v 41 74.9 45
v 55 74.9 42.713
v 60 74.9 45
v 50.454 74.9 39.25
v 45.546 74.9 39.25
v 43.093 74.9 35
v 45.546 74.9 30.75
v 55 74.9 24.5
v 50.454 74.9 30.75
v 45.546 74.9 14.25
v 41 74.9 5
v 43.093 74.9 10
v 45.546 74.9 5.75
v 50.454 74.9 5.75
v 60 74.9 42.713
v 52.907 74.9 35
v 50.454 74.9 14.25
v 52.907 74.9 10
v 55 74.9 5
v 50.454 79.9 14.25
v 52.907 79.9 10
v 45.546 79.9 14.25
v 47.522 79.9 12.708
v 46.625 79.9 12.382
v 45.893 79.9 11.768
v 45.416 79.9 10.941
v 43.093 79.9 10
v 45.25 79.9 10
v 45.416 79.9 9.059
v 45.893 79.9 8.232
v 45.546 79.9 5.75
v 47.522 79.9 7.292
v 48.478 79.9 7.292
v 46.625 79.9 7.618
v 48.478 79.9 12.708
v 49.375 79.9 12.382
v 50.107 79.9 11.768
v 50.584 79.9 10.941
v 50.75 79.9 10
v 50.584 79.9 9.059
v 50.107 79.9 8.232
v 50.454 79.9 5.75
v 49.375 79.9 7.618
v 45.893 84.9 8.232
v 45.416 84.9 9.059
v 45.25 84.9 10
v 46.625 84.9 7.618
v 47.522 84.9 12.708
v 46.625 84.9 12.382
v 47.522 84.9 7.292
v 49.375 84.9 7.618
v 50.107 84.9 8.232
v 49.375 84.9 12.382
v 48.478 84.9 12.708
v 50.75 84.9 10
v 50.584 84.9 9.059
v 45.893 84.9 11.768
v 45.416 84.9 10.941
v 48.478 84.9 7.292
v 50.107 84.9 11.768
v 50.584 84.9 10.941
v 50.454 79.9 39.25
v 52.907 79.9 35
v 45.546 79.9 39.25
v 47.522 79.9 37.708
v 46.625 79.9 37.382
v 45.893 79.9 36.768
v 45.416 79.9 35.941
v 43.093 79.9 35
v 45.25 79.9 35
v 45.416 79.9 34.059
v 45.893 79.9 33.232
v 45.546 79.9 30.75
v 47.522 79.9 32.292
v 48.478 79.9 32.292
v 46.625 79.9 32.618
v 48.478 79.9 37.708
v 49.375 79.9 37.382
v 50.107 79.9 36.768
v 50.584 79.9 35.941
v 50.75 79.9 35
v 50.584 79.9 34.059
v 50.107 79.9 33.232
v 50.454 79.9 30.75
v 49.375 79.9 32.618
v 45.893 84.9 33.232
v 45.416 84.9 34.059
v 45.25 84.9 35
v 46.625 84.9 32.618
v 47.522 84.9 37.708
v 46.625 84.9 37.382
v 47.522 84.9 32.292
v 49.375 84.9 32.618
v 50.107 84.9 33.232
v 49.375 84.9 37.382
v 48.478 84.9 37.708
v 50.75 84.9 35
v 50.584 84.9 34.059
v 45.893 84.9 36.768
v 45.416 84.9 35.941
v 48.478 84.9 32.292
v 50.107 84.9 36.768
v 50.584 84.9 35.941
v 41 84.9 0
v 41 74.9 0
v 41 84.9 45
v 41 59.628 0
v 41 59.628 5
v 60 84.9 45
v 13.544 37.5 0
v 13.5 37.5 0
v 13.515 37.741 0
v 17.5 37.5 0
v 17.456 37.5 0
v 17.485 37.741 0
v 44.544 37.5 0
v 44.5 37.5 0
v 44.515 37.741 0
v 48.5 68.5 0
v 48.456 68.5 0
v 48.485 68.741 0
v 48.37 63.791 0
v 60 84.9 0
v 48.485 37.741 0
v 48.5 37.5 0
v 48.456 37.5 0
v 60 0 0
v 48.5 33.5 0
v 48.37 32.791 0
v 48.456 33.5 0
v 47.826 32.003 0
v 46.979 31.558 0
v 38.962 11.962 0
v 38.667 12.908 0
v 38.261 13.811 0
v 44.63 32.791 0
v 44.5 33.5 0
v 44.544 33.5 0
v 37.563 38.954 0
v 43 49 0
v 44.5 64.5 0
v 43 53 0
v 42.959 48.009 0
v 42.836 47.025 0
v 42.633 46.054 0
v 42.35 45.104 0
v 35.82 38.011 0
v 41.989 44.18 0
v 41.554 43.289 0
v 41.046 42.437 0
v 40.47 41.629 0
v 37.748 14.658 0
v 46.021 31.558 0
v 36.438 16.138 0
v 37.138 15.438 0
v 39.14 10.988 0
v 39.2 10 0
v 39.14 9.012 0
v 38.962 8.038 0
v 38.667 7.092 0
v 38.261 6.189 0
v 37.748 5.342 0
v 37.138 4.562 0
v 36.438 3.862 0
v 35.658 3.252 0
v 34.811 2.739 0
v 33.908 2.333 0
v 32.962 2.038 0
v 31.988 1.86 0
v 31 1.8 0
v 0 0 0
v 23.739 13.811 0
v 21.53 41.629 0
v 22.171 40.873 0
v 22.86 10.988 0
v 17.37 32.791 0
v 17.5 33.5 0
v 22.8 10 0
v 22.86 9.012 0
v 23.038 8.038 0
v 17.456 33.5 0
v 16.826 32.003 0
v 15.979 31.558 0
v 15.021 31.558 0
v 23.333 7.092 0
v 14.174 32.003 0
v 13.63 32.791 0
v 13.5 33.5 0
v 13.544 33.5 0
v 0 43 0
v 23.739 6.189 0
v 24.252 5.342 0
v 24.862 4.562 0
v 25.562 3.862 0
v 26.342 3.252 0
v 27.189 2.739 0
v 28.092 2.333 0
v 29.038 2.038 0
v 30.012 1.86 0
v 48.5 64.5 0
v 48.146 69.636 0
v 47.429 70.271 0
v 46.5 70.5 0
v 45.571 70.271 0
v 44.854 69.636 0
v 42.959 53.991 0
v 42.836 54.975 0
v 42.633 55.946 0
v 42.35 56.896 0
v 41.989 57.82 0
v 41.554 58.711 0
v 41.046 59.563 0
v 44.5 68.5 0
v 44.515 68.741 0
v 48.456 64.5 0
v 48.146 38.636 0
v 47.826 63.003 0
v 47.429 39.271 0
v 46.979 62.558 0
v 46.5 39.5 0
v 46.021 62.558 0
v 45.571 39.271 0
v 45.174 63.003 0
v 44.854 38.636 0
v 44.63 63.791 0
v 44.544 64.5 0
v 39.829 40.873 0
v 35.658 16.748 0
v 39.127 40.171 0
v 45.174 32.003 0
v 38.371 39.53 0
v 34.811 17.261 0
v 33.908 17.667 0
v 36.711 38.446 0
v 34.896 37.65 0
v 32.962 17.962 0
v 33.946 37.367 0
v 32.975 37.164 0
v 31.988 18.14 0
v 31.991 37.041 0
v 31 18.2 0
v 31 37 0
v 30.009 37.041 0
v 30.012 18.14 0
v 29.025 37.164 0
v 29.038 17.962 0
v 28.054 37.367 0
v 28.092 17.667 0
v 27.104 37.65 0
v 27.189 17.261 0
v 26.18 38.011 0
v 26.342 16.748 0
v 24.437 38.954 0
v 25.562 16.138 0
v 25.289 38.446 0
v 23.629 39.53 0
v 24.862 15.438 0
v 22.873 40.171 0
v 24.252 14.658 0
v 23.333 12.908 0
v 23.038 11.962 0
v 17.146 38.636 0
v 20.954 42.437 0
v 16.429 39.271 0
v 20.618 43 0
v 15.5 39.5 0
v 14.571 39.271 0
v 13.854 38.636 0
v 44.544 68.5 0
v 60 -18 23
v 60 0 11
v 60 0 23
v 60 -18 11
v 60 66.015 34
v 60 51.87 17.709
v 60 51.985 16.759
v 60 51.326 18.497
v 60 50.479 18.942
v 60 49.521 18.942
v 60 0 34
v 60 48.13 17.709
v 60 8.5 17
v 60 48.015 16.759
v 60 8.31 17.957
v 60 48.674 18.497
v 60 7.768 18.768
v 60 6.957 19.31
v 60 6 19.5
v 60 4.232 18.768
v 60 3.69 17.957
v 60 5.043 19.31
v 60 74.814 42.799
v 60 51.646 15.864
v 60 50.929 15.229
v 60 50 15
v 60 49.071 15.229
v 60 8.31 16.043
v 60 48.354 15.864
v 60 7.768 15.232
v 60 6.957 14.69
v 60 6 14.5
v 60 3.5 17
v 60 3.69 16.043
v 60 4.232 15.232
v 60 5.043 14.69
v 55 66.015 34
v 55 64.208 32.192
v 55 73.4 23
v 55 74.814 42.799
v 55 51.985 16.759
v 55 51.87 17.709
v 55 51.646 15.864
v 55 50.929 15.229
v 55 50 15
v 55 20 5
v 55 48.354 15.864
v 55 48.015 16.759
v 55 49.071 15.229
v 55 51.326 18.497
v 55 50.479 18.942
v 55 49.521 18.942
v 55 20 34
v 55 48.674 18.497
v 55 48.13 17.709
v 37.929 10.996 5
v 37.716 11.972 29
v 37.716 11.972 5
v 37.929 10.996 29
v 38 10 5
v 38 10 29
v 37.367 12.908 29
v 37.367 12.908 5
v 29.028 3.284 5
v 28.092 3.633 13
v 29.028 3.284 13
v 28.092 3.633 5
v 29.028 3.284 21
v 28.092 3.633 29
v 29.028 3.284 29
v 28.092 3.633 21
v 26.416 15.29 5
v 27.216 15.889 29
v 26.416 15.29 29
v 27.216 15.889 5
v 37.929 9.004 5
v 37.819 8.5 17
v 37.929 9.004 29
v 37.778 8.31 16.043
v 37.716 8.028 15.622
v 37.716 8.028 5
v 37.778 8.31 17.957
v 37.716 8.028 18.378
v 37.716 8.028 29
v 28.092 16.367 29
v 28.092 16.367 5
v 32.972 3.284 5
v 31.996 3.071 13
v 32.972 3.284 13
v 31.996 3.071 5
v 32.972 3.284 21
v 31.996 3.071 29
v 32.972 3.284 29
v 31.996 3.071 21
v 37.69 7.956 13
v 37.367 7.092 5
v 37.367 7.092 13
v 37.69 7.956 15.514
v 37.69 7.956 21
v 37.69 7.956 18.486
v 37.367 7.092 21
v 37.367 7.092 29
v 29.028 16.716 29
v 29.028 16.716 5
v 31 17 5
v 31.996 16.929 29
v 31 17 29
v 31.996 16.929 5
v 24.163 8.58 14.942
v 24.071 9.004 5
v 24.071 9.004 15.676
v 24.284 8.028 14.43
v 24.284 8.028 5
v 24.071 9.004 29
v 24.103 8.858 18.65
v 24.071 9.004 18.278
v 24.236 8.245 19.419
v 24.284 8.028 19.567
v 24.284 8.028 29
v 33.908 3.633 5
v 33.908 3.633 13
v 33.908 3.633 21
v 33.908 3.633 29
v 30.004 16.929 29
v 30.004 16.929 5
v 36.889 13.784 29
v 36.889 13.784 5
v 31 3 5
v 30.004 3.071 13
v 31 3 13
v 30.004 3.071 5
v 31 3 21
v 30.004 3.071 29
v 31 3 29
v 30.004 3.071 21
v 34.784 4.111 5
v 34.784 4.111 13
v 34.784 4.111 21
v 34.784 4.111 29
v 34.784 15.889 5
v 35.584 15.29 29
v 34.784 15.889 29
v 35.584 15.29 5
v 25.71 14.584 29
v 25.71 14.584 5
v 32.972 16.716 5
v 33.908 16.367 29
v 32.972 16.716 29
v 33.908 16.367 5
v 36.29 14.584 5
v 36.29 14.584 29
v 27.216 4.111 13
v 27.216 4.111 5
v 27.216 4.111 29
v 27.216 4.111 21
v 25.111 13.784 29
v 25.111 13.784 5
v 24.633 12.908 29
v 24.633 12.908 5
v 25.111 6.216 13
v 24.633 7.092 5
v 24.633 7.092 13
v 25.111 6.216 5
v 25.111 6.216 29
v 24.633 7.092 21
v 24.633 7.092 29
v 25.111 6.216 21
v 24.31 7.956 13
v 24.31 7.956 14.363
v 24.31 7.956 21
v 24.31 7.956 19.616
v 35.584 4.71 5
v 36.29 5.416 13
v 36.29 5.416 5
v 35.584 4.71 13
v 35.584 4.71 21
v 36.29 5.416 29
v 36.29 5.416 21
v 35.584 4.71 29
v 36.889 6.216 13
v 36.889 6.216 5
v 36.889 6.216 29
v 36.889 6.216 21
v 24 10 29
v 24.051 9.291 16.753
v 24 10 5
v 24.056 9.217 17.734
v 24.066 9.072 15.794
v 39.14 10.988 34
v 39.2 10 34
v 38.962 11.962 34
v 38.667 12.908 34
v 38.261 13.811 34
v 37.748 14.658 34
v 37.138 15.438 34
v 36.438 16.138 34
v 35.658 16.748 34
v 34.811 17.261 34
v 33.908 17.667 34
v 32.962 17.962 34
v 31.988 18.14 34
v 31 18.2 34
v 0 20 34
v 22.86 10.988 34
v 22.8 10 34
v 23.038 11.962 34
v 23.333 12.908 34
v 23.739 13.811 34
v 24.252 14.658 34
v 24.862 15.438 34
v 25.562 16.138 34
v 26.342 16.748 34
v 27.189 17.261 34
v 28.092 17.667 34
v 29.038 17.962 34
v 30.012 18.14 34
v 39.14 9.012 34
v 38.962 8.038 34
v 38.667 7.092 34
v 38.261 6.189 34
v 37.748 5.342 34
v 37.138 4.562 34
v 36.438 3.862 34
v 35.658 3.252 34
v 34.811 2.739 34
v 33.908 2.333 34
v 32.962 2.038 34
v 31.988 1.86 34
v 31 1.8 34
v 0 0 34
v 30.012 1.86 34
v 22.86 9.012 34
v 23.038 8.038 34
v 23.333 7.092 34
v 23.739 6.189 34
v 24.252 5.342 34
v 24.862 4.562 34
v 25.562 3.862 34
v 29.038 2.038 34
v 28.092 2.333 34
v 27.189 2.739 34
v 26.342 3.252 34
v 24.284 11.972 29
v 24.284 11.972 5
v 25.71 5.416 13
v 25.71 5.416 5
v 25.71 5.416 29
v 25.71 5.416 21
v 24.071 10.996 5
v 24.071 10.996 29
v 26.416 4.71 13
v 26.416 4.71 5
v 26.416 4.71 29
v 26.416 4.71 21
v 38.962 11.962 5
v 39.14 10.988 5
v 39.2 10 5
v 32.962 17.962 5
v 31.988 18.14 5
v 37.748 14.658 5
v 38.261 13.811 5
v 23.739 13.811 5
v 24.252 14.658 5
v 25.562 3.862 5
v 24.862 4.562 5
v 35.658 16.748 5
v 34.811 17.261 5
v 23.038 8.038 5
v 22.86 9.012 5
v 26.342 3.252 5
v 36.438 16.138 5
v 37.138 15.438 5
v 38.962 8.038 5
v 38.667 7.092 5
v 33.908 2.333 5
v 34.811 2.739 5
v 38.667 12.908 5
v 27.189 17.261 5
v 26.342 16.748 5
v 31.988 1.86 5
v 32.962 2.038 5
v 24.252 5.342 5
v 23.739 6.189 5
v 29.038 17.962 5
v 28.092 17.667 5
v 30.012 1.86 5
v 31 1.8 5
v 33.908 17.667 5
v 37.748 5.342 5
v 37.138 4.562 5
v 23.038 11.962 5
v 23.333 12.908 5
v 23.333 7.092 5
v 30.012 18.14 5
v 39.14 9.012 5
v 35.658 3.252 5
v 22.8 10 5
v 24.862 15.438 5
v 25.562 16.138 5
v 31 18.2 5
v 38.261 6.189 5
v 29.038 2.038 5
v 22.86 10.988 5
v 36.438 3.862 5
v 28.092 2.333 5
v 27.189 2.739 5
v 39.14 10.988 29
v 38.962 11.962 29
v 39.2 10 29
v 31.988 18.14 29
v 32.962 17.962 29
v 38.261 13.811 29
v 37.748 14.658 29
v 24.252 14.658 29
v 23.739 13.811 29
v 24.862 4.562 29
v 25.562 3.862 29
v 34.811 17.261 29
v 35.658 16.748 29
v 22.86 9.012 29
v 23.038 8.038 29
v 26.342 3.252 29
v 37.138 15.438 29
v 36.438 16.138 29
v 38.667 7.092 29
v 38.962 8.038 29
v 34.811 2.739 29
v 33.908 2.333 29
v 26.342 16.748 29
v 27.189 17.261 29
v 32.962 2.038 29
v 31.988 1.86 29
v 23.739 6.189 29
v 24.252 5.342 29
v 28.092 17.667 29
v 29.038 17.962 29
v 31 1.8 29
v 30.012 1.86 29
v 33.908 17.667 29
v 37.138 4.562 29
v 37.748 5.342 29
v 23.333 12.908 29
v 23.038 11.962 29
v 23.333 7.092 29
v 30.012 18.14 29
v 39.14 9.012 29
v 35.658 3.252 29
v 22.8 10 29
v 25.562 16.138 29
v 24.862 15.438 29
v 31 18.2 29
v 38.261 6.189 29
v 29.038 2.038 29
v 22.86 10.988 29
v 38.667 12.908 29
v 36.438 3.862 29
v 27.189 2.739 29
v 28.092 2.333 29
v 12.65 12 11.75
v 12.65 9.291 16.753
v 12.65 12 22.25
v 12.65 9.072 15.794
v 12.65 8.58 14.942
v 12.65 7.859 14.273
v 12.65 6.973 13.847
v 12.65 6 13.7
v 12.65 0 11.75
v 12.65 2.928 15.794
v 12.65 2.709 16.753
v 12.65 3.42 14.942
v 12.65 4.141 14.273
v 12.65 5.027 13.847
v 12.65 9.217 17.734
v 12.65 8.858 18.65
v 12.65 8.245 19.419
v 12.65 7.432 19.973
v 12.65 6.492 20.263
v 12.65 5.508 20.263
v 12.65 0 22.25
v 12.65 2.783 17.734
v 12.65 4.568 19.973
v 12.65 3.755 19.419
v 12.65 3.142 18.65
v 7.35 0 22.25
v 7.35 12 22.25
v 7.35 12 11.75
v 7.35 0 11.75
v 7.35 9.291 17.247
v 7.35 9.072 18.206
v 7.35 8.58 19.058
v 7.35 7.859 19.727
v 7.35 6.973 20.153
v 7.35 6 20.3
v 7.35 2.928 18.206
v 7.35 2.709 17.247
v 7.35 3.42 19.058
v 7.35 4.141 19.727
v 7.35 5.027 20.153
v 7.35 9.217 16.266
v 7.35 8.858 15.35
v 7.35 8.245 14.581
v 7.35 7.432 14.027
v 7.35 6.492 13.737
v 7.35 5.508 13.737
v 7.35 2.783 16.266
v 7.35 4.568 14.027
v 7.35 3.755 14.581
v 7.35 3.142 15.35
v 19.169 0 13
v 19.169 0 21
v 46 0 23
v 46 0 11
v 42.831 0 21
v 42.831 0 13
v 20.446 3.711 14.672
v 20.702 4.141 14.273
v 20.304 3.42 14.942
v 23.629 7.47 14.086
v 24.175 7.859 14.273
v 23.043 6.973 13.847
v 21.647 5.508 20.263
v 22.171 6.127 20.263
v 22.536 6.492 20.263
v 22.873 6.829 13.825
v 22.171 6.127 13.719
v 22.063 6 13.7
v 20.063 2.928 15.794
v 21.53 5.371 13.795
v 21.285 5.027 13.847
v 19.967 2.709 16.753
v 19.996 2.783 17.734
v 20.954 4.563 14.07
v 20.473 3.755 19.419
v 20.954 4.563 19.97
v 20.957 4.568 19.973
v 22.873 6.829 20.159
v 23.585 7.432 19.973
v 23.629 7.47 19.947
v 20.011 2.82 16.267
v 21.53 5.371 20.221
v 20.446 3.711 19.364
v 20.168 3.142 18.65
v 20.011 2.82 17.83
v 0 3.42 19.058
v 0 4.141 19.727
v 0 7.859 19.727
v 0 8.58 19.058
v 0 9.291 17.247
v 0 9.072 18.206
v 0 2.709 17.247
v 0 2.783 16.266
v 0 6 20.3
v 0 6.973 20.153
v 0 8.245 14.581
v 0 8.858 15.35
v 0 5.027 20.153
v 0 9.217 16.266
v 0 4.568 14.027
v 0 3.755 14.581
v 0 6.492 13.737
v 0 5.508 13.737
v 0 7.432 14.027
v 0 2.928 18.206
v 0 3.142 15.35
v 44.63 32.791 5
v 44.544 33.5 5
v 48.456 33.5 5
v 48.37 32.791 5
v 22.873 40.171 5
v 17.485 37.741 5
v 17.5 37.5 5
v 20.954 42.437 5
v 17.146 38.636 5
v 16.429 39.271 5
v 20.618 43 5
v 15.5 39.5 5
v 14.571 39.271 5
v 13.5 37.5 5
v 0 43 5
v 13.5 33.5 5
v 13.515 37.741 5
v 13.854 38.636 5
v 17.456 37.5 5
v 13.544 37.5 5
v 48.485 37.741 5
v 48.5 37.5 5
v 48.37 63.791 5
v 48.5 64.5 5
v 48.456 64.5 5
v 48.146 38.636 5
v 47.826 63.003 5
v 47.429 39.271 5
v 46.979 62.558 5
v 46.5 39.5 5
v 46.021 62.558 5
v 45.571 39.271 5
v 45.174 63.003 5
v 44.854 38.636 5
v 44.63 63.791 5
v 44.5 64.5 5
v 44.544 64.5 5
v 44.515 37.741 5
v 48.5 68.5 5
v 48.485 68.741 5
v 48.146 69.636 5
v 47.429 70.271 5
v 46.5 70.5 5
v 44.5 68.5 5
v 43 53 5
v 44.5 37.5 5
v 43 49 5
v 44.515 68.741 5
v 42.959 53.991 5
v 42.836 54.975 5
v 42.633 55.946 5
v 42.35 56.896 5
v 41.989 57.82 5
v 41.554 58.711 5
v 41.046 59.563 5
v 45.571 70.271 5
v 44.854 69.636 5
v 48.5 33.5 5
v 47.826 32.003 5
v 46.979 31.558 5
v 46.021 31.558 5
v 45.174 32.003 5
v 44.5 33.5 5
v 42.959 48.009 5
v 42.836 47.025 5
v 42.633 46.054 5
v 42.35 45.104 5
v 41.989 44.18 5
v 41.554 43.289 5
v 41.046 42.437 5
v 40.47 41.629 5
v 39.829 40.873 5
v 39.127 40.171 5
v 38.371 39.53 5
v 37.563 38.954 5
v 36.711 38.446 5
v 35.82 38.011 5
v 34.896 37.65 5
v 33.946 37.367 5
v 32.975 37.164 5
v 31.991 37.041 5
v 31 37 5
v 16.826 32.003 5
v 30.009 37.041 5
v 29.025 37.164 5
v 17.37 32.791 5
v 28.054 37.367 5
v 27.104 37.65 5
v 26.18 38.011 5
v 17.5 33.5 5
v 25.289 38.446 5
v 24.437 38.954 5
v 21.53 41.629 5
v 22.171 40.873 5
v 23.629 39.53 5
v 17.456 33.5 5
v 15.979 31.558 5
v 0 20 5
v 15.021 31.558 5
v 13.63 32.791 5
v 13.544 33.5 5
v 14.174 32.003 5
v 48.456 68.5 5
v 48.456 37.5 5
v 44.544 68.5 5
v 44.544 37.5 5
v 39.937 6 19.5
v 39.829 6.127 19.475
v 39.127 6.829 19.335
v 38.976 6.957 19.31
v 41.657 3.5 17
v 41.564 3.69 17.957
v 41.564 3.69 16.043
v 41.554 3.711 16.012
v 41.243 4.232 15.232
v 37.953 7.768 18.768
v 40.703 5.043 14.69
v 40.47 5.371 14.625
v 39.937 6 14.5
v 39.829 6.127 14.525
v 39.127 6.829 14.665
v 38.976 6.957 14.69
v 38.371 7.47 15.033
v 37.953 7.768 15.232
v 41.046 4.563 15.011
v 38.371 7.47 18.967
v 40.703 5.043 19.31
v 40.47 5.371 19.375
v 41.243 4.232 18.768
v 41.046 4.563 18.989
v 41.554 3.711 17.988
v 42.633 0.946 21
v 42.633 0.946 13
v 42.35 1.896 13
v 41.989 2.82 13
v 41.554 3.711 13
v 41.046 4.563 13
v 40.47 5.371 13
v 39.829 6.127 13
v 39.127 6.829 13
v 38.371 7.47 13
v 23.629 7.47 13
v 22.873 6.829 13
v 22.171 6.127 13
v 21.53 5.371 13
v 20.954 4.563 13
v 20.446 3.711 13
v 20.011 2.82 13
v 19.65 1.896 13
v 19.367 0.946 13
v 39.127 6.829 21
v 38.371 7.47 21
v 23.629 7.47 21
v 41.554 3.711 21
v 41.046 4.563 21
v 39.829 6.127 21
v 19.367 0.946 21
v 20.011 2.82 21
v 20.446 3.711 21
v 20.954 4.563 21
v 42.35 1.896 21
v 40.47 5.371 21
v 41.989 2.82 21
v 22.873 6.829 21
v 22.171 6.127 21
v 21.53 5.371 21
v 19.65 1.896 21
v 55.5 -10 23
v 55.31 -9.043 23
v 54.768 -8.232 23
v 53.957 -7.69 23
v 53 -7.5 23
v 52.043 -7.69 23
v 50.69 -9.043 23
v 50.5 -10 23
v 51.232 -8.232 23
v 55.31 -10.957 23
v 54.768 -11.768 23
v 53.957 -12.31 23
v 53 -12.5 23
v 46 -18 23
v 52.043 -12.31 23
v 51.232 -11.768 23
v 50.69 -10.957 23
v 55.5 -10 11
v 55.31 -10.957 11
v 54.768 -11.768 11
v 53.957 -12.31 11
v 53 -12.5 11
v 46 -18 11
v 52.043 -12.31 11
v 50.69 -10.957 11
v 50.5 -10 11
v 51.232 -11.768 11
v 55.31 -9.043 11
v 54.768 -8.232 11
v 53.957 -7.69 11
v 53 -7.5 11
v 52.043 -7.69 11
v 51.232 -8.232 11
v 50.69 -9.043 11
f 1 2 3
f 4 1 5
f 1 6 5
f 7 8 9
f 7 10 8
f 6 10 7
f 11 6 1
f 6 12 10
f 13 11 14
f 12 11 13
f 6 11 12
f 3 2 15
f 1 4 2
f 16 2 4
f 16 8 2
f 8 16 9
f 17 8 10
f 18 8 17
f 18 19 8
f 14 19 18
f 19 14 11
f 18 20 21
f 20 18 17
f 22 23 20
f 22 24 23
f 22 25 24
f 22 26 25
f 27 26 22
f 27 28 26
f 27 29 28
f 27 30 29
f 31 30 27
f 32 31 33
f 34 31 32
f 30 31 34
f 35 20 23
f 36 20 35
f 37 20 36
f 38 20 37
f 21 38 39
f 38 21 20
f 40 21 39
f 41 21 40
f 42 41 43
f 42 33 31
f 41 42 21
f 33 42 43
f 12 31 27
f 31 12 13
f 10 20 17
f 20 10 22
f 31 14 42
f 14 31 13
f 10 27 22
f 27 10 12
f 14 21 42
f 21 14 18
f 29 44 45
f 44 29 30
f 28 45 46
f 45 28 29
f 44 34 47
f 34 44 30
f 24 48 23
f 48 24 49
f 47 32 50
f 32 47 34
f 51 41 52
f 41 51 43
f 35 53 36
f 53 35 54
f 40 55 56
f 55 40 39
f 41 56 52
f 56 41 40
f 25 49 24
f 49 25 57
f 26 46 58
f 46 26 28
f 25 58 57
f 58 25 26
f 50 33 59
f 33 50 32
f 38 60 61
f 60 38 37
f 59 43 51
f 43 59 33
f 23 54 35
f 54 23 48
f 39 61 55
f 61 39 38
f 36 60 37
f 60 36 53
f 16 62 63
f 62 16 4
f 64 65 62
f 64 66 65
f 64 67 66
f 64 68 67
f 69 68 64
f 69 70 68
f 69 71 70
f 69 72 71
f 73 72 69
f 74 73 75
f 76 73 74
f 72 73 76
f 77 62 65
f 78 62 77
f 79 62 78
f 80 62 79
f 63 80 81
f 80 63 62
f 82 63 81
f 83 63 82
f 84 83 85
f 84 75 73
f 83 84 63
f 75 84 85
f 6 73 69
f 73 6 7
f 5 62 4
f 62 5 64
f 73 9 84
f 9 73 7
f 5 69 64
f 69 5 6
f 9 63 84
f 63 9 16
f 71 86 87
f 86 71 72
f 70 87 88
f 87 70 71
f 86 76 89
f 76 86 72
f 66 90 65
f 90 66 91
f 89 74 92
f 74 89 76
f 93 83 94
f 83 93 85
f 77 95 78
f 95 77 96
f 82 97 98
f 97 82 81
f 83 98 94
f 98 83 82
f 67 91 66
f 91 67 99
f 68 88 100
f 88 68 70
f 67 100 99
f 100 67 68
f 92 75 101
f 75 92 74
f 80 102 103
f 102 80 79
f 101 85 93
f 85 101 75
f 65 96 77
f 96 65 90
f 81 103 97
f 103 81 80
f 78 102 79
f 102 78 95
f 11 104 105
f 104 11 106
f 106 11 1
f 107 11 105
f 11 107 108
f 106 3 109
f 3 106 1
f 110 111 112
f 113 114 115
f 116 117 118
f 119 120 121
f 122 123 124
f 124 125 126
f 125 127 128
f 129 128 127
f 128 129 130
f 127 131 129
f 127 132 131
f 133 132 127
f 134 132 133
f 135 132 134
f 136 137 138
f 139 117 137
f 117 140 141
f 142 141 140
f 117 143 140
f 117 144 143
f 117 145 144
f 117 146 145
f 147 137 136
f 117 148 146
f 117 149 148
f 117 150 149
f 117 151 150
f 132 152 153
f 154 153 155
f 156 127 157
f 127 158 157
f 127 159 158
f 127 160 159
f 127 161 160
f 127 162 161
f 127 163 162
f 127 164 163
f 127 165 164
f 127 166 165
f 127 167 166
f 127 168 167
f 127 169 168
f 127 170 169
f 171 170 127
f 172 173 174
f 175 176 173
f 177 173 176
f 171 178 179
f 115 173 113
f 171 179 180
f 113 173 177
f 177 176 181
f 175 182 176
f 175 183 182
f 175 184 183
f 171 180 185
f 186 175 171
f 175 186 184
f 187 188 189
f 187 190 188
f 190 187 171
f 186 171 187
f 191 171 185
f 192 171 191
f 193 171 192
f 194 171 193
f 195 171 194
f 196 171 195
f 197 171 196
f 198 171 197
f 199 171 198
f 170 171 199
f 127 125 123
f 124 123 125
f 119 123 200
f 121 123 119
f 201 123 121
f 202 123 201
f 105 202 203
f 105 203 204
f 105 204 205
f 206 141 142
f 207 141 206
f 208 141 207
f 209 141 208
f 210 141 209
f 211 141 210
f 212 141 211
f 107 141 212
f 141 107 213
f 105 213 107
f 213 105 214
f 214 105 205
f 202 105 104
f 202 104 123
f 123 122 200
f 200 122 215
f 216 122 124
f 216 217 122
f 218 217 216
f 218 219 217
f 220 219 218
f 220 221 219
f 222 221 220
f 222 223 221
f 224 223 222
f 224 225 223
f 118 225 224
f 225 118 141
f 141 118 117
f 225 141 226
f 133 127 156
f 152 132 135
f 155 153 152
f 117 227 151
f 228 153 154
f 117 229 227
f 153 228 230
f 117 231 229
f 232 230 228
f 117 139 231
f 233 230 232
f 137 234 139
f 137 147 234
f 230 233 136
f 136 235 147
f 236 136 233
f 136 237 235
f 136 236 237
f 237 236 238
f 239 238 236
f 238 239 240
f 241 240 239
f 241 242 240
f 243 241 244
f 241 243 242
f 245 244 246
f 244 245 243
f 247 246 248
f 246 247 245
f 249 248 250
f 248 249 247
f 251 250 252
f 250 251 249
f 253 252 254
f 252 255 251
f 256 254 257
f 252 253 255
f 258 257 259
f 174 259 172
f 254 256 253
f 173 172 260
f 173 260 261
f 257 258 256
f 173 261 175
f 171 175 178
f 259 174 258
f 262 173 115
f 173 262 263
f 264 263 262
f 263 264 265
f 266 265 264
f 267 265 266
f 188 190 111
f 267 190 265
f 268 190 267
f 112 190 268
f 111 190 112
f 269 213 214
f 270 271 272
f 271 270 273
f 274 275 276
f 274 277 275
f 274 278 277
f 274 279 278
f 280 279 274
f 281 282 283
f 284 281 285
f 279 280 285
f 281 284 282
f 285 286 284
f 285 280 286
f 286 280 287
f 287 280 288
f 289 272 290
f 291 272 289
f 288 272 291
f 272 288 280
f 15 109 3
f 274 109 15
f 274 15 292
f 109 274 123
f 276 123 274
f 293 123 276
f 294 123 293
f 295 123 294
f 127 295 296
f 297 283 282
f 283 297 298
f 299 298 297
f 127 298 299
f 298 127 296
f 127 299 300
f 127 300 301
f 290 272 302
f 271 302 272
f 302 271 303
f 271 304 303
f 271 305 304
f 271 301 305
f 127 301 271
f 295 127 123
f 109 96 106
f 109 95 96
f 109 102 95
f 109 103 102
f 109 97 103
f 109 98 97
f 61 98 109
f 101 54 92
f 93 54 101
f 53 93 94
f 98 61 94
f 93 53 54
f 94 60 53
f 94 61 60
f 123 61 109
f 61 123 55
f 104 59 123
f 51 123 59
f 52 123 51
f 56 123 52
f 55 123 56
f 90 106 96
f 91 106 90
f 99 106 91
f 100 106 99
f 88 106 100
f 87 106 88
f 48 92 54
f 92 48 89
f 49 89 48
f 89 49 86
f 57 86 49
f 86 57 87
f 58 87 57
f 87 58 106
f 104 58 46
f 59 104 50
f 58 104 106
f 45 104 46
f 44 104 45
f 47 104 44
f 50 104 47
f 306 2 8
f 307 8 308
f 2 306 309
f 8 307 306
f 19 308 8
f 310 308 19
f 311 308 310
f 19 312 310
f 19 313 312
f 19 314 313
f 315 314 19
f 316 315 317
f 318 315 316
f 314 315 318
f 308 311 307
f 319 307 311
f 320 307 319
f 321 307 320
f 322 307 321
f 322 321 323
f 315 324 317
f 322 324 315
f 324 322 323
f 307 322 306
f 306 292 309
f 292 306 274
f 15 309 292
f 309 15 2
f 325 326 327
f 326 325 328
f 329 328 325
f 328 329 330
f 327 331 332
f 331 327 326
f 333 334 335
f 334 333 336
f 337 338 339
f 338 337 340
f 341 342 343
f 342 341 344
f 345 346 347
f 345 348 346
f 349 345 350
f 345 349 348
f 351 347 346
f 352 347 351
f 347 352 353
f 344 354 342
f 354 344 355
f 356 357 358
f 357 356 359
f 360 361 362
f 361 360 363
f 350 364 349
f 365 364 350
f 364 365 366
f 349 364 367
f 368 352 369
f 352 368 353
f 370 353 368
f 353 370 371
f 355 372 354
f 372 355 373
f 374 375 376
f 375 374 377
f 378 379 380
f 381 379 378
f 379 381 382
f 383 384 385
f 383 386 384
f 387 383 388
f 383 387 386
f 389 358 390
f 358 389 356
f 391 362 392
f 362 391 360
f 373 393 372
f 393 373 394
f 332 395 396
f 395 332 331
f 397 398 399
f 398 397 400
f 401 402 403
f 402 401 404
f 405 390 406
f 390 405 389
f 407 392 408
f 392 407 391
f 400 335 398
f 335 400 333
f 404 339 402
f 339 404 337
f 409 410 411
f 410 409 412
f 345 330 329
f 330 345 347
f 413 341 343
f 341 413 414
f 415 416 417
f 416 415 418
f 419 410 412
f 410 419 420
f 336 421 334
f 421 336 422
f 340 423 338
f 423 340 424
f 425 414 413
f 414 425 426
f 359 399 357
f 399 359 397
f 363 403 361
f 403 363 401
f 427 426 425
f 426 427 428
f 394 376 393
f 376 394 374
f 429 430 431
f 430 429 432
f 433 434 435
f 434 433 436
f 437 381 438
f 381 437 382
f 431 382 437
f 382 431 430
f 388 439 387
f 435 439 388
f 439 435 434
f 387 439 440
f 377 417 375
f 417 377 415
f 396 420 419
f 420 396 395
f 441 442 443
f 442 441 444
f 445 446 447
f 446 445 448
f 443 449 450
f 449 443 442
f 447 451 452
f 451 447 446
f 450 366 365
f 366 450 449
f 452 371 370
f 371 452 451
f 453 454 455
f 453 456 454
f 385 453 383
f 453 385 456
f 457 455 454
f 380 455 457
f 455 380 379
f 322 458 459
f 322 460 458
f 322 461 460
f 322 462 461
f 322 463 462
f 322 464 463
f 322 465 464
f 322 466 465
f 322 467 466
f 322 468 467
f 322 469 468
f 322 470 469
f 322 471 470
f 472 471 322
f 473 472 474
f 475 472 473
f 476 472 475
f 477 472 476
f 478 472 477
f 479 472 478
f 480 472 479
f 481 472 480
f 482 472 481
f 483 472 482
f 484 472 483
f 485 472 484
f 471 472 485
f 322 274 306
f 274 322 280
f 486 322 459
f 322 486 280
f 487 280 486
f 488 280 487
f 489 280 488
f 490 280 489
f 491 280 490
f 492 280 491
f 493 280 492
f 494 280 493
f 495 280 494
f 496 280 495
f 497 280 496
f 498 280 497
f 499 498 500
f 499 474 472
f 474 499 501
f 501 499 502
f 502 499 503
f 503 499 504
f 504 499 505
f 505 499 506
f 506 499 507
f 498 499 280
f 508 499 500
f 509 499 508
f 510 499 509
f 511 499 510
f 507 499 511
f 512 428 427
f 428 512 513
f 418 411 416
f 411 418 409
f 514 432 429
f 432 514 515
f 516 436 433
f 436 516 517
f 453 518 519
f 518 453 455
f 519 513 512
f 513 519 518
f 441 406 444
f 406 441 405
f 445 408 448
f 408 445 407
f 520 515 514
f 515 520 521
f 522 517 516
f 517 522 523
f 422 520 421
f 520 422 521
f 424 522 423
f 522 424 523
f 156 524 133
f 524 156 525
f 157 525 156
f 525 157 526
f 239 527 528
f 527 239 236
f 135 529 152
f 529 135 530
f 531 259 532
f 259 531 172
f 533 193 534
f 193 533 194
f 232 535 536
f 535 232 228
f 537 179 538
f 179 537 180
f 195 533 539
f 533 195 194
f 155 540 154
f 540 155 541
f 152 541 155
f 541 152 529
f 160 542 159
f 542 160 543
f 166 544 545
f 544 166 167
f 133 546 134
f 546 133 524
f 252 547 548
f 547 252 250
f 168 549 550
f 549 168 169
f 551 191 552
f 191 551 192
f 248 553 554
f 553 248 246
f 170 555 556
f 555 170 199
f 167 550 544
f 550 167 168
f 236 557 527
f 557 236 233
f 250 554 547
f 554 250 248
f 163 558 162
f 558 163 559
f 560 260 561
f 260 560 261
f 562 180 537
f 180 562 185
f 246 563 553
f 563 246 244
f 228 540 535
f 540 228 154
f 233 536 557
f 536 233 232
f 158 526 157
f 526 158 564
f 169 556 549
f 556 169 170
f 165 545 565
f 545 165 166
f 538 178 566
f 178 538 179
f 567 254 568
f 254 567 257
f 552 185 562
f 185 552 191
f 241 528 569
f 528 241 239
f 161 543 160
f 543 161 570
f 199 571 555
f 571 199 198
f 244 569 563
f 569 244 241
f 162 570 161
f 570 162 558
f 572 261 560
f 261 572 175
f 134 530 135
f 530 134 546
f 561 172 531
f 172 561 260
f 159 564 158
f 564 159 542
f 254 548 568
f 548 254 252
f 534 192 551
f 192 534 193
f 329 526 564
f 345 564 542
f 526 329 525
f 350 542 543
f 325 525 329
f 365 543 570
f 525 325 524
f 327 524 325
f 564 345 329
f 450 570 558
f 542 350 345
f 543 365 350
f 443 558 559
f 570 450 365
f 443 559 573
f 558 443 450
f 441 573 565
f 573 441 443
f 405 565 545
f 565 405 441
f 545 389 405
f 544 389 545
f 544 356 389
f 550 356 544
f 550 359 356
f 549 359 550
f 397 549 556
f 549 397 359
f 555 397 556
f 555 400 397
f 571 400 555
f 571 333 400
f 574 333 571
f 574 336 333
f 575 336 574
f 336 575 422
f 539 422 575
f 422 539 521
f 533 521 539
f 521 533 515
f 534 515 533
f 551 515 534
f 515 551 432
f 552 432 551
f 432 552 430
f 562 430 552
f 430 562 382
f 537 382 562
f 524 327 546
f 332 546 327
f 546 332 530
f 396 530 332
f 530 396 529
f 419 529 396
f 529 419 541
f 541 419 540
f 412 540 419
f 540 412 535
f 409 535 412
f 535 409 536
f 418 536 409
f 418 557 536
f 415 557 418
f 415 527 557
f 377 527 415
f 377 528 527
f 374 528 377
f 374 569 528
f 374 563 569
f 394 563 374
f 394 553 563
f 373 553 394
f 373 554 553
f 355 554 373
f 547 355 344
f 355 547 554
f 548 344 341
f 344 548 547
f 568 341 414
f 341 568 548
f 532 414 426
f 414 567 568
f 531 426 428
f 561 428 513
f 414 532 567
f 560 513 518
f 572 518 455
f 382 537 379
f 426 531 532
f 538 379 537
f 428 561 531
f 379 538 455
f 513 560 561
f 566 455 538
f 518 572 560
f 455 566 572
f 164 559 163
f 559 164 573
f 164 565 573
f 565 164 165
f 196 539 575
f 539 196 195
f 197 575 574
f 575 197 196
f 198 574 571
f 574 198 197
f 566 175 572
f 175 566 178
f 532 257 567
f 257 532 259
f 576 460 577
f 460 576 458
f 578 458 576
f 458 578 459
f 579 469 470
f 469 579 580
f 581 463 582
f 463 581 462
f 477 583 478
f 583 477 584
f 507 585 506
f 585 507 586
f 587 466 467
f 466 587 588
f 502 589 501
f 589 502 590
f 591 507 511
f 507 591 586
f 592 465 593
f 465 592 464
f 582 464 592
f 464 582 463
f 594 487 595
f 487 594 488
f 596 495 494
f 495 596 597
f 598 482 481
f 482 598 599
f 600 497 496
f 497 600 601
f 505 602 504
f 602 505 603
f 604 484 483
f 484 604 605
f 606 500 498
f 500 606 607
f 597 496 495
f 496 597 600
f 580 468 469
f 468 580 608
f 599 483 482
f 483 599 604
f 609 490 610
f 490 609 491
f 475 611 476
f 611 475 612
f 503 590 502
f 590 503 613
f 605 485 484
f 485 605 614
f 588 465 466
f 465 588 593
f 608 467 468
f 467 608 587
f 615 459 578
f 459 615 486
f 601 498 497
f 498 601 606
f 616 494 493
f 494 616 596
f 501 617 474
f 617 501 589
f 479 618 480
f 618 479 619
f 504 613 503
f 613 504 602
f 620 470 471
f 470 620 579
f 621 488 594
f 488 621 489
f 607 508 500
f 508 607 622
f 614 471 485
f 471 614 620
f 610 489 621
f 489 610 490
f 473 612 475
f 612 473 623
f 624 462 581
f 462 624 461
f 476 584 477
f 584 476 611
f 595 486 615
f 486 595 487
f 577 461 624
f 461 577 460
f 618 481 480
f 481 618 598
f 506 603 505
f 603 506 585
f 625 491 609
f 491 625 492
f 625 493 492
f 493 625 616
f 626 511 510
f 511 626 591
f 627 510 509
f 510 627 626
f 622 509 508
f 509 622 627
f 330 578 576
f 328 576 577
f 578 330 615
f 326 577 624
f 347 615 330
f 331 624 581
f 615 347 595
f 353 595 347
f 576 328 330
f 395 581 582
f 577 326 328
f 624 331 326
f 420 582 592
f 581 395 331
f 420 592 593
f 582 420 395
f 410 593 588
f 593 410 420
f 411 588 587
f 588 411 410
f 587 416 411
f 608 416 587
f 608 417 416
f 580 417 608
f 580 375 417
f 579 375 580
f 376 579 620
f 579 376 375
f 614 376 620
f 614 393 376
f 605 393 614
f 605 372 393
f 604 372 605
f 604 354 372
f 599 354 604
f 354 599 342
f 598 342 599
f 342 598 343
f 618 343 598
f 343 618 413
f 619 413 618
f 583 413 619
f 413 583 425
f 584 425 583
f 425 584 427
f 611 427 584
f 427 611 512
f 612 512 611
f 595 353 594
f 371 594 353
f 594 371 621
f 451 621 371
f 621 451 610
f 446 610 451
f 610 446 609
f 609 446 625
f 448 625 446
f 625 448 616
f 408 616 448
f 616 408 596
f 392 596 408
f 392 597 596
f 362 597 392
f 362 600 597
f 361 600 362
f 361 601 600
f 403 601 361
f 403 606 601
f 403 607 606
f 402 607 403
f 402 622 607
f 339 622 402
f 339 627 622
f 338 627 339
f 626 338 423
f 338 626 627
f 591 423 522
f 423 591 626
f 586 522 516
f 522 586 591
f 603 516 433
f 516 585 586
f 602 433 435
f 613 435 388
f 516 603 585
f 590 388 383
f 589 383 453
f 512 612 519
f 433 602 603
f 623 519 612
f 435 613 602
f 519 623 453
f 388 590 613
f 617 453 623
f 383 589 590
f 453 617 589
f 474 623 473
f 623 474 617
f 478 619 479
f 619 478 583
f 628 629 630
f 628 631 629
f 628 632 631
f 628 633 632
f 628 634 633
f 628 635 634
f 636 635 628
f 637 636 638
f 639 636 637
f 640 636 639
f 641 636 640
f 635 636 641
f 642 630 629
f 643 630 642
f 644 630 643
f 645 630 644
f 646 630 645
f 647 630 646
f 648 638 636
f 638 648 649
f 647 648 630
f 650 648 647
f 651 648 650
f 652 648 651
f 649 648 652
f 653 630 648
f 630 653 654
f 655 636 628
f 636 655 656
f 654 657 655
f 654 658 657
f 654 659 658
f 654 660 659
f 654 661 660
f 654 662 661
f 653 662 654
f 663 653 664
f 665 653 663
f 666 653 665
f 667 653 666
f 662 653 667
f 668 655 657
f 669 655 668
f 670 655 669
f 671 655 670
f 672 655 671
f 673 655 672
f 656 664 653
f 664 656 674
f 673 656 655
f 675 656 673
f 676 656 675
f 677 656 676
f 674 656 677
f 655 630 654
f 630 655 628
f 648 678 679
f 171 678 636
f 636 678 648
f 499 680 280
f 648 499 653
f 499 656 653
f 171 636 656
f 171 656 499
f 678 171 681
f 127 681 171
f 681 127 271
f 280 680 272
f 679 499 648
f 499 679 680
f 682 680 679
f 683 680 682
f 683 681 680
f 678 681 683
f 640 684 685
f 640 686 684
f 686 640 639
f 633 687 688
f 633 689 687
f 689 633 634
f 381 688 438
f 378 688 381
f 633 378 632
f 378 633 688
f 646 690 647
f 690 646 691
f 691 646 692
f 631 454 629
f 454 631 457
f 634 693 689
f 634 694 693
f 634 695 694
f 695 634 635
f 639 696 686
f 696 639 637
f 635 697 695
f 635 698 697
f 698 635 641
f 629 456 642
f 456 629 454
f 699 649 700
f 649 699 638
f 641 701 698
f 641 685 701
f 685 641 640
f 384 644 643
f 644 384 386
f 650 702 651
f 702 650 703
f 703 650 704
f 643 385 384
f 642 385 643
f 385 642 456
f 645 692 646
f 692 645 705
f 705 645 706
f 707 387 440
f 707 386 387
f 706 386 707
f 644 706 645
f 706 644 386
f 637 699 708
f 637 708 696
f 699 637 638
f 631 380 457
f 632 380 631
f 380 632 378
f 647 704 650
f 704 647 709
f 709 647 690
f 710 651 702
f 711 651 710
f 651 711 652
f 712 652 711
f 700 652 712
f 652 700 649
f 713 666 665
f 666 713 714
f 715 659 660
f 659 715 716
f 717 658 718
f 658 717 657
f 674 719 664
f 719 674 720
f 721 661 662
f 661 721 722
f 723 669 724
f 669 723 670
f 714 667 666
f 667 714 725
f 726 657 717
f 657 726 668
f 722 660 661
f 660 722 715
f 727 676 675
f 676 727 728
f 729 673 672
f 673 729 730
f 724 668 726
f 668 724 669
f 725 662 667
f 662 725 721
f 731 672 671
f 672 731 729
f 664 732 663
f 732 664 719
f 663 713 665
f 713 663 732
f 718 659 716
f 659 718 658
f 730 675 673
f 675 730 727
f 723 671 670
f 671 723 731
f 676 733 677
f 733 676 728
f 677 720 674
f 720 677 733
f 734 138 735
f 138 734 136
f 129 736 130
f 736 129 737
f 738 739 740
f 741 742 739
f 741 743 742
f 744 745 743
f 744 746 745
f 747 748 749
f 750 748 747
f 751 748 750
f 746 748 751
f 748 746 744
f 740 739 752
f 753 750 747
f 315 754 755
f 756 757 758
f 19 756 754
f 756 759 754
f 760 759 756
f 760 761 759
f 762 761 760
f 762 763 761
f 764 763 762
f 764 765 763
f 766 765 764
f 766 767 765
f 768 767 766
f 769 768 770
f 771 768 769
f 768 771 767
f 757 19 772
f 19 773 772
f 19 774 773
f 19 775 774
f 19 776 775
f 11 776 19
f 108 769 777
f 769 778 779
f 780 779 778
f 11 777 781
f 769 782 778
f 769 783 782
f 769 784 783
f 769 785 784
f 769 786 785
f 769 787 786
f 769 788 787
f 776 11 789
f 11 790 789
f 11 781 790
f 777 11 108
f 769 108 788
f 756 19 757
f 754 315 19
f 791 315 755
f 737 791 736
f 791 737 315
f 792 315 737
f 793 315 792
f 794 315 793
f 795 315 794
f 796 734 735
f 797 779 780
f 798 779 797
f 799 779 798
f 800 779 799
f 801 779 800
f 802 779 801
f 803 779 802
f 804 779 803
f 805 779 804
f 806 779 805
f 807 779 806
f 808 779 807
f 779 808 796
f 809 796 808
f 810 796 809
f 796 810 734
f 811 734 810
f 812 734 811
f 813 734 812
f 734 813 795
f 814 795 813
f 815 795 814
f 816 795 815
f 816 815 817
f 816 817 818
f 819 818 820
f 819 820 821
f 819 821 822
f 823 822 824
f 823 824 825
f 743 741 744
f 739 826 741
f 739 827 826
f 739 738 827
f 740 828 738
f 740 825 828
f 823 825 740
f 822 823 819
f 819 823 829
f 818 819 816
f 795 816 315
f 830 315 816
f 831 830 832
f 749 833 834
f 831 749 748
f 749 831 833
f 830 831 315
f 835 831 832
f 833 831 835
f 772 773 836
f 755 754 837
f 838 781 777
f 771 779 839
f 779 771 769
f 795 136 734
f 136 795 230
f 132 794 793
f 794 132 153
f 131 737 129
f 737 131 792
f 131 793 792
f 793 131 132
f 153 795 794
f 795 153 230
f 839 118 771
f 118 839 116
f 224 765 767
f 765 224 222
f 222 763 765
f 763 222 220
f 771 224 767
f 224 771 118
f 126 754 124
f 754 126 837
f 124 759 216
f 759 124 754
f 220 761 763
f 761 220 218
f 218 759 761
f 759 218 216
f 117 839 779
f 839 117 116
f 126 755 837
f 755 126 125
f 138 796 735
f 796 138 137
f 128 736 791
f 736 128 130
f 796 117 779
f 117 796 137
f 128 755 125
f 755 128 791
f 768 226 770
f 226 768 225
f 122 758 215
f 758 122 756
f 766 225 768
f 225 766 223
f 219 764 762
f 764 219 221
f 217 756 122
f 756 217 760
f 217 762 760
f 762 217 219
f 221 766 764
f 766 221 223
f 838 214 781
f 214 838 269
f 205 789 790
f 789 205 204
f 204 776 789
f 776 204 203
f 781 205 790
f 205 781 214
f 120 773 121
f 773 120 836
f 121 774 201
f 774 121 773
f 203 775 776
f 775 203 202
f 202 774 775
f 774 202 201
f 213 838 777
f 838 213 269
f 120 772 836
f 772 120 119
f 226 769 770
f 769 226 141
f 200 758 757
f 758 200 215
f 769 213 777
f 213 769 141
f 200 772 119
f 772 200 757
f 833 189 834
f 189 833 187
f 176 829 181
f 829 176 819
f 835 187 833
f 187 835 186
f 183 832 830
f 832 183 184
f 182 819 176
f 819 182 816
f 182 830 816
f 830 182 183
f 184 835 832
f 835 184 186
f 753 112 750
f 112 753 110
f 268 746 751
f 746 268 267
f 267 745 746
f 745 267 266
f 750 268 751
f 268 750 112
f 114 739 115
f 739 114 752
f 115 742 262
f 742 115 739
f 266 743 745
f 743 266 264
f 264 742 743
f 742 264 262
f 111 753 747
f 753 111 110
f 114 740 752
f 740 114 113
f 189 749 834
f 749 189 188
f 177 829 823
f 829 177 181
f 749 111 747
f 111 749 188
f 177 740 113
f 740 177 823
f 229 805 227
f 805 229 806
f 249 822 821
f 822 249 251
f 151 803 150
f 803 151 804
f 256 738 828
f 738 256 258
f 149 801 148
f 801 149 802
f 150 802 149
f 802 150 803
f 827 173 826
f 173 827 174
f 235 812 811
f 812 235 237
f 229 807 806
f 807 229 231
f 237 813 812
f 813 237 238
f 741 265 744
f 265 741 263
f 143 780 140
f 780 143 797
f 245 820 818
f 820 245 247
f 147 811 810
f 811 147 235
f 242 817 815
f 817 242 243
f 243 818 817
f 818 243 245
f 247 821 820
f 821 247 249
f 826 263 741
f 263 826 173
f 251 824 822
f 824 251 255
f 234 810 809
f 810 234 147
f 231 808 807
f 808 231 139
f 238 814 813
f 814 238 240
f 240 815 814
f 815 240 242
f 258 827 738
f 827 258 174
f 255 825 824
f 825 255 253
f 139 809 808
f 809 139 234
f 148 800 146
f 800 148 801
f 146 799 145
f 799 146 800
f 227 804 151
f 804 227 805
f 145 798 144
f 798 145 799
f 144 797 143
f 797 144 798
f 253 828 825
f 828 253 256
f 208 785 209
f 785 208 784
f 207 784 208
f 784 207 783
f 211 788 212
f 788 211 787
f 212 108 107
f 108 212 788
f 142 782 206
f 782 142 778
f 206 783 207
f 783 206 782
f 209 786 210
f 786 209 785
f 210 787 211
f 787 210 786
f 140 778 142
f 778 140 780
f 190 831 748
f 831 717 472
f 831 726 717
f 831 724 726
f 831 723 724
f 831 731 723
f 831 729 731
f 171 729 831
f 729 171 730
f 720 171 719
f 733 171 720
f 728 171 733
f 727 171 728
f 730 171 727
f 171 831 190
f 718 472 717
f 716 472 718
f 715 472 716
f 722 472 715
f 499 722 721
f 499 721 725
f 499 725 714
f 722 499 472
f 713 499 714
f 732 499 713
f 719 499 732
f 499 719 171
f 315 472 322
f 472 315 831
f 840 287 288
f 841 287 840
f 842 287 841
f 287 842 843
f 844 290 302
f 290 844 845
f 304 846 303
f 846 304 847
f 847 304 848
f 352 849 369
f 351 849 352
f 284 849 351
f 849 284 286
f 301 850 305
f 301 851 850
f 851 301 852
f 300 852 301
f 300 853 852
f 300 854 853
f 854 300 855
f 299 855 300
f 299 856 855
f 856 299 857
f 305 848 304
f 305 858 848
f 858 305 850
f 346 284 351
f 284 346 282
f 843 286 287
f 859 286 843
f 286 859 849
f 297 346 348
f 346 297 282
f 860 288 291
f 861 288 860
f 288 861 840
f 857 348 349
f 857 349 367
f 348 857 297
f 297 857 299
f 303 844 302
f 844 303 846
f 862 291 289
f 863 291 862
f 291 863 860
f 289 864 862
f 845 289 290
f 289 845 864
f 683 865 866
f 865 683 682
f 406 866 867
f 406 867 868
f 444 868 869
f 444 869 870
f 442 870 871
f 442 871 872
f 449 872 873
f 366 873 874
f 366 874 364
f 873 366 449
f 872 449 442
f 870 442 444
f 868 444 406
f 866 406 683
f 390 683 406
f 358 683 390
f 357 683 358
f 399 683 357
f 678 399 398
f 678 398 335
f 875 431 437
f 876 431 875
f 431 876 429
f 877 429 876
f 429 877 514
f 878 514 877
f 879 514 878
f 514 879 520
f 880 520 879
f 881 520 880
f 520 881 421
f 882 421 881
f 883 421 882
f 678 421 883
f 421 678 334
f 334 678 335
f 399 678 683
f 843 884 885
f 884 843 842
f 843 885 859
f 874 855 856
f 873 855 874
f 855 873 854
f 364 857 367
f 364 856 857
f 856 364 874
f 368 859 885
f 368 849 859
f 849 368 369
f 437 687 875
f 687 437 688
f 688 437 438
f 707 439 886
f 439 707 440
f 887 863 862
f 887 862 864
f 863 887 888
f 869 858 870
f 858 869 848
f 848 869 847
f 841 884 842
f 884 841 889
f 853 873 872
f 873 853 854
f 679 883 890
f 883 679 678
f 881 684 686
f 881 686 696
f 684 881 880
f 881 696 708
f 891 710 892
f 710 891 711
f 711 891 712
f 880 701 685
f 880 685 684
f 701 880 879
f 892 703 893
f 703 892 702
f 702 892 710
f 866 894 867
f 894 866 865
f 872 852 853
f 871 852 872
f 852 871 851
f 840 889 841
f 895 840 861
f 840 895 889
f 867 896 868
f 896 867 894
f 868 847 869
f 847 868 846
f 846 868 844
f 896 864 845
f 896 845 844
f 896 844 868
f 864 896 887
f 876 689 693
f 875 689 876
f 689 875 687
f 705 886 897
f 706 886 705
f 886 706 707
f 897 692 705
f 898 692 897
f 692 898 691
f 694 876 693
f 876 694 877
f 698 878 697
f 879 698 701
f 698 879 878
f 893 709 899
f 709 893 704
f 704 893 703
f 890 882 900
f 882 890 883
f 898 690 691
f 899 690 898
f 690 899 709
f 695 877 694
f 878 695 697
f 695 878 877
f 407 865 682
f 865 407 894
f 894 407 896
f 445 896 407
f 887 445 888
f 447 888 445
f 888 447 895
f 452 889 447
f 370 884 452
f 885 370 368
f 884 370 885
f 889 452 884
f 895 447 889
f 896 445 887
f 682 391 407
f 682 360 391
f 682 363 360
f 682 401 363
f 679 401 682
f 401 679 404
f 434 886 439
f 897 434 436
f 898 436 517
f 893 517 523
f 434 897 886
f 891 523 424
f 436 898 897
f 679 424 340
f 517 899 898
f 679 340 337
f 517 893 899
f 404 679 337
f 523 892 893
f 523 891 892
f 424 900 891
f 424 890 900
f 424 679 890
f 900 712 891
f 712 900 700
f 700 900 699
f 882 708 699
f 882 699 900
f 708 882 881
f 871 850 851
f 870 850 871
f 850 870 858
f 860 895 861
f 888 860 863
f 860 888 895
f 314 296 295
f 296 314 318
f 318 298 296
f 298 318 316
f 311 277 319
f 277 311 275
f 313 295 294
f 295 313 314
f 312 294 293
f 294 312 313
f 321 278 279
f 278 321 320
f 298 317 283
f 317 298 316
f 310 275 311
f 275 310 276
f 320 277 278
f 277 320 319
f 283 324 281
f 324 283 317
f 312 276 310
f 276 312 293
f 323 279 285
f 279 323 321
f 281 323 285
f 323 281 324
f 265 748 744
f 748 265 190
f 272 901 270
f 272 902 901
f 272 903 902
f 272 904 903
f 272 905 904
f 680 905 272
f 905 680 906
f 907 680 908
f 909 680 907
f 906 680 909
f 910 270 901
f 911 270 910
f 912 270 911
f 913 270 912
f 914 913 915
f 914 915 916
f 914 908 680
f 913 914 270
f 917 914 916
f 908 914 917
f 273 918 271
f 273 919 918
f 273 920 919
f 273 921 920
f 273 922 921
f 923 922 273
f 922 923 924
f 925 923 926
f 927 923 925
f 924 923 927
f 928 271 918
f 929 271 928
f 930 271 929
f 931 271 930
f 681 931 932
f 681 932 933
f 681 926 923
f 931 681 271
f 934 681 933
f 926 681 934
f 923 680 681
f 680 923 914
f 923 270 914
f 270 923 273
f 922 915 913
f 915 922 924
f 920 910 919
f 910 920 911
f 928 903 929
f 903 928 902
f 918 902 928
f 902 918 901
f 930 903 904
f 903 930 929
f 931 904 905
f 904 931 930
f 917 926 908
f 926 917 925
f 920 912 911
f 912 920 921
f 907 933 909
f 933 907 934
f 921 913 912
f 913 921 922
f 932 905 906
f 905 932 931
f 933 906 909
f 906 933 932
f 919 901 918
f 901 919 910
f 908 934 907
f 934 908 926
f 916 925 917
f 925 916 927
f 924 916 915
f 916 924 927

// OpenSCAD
// file: util.scad
/* Tête de vis six pans
	d = distance plat à plat opposé. 
 	h = épaisseur de l'écrou 
*/
module sixpans(d, h) {

	for(i=[0:60:120]) 
	rotate(i+30, [0,0,1]) cube([d,d*tan(30),h], true);
}

/* Ovale plat (pour trous coulissants)
	d = diamètre du trou
   l = longueur du trou 
	h = épaisseur du trou
*/
module ovale(d, l, h) {
	translate([-(l-d)/2,0,0]) cylinder(h, d/2, d/2, true);
	translate([(l-d)/2,0,0])	cylinder(h, d/2, d/2, true);
	cube([l-d,d,h],true);
}

/* Trous pour un moteur Nama 17
	h = épaisseur des trous
	j = jeu de glissement
*/
module nema17(h, j) {
	translate([-15.5,-15.5,0]) ovale(4, 4 + j, h);
	translate([ 15.5,-15.5,0]) ovale(4, 4 + j, h);
	translate([-15.5, 15.5,0]) ovale(4, 4 + j, h);
	translate([ 15.5, 15.5,0]) ovale(4, 4 + j, h);
	ovale(24, 24 + j, h);
}

/* Vis six pans
	de = distance plat à plat opposé de la tête
 	he = épaisseur de la tête
	dv = diamètre de la vis
	l = longueur totale de la vis
*/
module vissixpans(de, he, dv, l) {
	translate([0,0,he/2]) sixpans(de, he);
	cylinder(l, dv/2,dv/2);
}

/* vis à tete cylindrique et son écrou six pans
	m = metric 3 = M3, 4 = M4, etc.
	h = longueur totale de la vis
*/
module vis_noyee(m, h) {
	if(m==3) {
		cylinder(3, 6.5/2, 6.5/2);
		cylinder(h, 3.8/2, 3.8/2);
		translate([0,0,h-3/2]) sixpans(5.9, 3);
	}
	else if(m==4) {
		cylinder(4, 8.5/2, 8.5/2);
		cylinder(h, 4.4/2, 4.4/2);
		translate([0,0,h-4/2]) sixpans(7.5, 4);
	}
	else if(m==5) {
		cylinder(5, 10.5/2, 10.5/2);
		cylinder(h, 5.5/2, 5.5/2);
		translate([0,0,h-5/2]) sixpans(8.5, 5);

	}
}

//vissixpans(6, 3, 3, 20);
// nema17(5, 4);
//ovale(5, 10, 3);
//sixpans(8, 3);
// main file
include <util.scad>;

$fa = 1;
$fs = 1;

sx = 60;
sy = 75;
sz = 34;

my = 20;
mx = 5;
mz = 5;

/* passage de la grosse visse */
ax = 31;
ay = my/2;

/* passage du filament */
fy = ay - 4;
fz = sz / 2;
fr = 2.5;

/* pression */
px = 50;
py = 75;
pz = sz - 10 - 1;
pe1 = 14;
pe2 = 14;
pinz = pz - 2 * 5;
pdy = 4;

raccord_y = 10; // position de la fixation entre le socle et la pression

entre_axes = 41; // axe moteur et axe grosse vis
entre_axes_2 = 4 - 0.5 + 3 + 11; // axe grosse vis et axe roulement de pression


module meca() {
	color("Black", 0.5) {
		cylinder(12, 32, 32);		
		cylinder(62, 4, 4);		
		translate([0, entre_axes, 0]) {
			cylinder(12, 10, 10);
			translate([0, 0, 10]) cylinder(10, 7.5, 7.5);		
			translate([0, 0, 20+47/2]) cube([42,42,47], true);
		}
		translate([0, -entre_axes_2, 20 + fz - mz]) {
			cylinder(7, 11, 11, true);
			cylinder(15, 3.9, 3.9, true);
		}
	}
}

module pression(view) {
	intersection() {
		translate([-20,-20,0]) {
			if(view==0) translate([0,0,-pz]) cube([px+40,py+40,2*pz]);
			else if(view==1) translate([0,0,-pz]) cube([px+40,py+40,pz]);
			else if(view==2) cube([px+40,py+40,pz]);
		}
		difference() {
			union() {
				translate([-43,-pdy,-pz/2]) {
					translate([35, 0,0]) {
						difference() {
							union() {
								translate([0,-pe2/2,0]) cube([px+pe1/2,pe2,pz]);	
								translate([px-pe1/2,-pe2/2+3,0]) rotate(-5,[0,0,1]) {
									cube([pe1,py+pe2/2,pz]);	
									translate([0,py-10,pz/2]) cube([16,pe2,pz],true); 
								}
							}
							translate([0,-pe2/2,(pz-pinz)/2]) cube([px+20,py-20,pinz]);
						}
					}
					translate([35 + px,0,pz/2]) cube([pe1,pe2,pz],true); 
					// cylinder(pz,10,10);		
				}
				cylinder(pz, 3.8, 3.8, true);
				difference() {
					cylinder(pz, 5.5, 5.5, true);
					// translate([-15/2,pe2/2-pdy,-15/2]) cube([15,25,15]);
					cube([15,15,7], true);
				}
			}
			//# cylinder(pz-2*3, 4, 4, true);
			translate([0,0,-pz/2]) {
				translate([0,0,0]) vis_noyee(3, pz);
				translate([-43+px+35,-pdy,0]) {
					vis_noyee(3, pz);
					rotate(-5,[0,0,1]) translate([0,py-5,0]) {
						vis_noyee(3, pz);
						translate([3,-10,pz/2]) rotate(-90,[0,1,0]) cylinder(30,5,5);
					}
				}
				translate([-ax+sx-7,entre_axes_2-ay-raccord_y,0]) cylinder(pz, 4.5/2, 4.5/2);
			}
	
		}
	}
}

module fixation(l) {
	translate([-13, 8, 0]) vissixpans(7, 5, 4.5, l);
	translate([-13,-8, 0]) vissixpans(7, 5, 4.5, l);
	translate([ 13,-8, 0]) vissixpans(7, 5, 4.5, l);
	translate([ 13, 8, 0]) vissixpans(7, 5, 4.5, l);
}

module fixtube(b1, b2, tr) {
	translate([-5.3/2, -fy,  -10.5/2]) {
		cube([5.3, fy + 6, 10.5]);
	}
	// translate([-b1,-fy,-tr]) cube([b1,fy,tr*2]);
	// translate([5.3/2,-fy,-tr]) cube([5,fy,tr*2]);
	rotate(90, [0,1,0]) cylinder(b2 + 5.3/2, tr, tr);
	rotate(270, [0,1,0]) cylinder(b1, tr, tr);
}

module printer_fix(ex) {
	translate([0,9.9,0]) {
		translate([-5,-11.5,sz-11]) rotate(45,[1,0,0]) cube([5,15,13]);
		rotate(180, [0,0,1]) {
			difference() {
				cube([ex, 10, 45]);
				translate([ex-7,-10,10]) {
					rotate(-90,[1,0,0]) vis_noyee(5, 20);
					translate([0,0,25]) rotate(-90,[1,0,0]) vis_noyee(5, 20);
				}
			}
		}
	}
}


//translate([ax,ay,-20+mz]) meca();
//translate([ax,-entre_axes_2+ay,fz]) pression(2);
translate([sx,sy,0]) printer_fix(19);

difference() {
	cube([sx,sy,sz]);
	translate([0,my,mz]) {
		cube([sx-mx,sy-my,sz-mz]);
	}
	translate([ax,ay,0]) {
		cylinder(sz, 7, 7);
		cylinder(5, 8.2, 8.2);
		translate([0,0,sz-5]) cylinder(5, 8.2, 8.2);
	}
	//// translate([ax,my+0.1,sz/2]) rotate(90,[1,0,0]) fixation(my+0.2);
	translate([0,fy,fz]) rotate(90,[0,1,0]) cylinder(sx, fr, fr); // filament
	translate([ax,fy - 8,fz]) cylinder(8, 12, 12, true);
	translate([10, fy, fz]) fixtube(11, 12, 3.3);
 	translate([ax,ay + entre_axes,mz/2]) rotate(90, [0,0,1]) nema17(mz, 4);
	translate([sx-mx,50,sz/2]) # rotate(90,[0,1,0]) cylinder(mx,2,2);
	translate([0,43,0]) cube([41,sy-43,mz]);
}

translate([0,0,sz/2]) {
	difference() {
		translate([sx-14/2,-18/2,0]) cube([14,18,pinz-1],true);
		translate([sx-14/2,-raccord_y,0]) cylinder(pinz-1,2.5,2.5, true);
	}
}
